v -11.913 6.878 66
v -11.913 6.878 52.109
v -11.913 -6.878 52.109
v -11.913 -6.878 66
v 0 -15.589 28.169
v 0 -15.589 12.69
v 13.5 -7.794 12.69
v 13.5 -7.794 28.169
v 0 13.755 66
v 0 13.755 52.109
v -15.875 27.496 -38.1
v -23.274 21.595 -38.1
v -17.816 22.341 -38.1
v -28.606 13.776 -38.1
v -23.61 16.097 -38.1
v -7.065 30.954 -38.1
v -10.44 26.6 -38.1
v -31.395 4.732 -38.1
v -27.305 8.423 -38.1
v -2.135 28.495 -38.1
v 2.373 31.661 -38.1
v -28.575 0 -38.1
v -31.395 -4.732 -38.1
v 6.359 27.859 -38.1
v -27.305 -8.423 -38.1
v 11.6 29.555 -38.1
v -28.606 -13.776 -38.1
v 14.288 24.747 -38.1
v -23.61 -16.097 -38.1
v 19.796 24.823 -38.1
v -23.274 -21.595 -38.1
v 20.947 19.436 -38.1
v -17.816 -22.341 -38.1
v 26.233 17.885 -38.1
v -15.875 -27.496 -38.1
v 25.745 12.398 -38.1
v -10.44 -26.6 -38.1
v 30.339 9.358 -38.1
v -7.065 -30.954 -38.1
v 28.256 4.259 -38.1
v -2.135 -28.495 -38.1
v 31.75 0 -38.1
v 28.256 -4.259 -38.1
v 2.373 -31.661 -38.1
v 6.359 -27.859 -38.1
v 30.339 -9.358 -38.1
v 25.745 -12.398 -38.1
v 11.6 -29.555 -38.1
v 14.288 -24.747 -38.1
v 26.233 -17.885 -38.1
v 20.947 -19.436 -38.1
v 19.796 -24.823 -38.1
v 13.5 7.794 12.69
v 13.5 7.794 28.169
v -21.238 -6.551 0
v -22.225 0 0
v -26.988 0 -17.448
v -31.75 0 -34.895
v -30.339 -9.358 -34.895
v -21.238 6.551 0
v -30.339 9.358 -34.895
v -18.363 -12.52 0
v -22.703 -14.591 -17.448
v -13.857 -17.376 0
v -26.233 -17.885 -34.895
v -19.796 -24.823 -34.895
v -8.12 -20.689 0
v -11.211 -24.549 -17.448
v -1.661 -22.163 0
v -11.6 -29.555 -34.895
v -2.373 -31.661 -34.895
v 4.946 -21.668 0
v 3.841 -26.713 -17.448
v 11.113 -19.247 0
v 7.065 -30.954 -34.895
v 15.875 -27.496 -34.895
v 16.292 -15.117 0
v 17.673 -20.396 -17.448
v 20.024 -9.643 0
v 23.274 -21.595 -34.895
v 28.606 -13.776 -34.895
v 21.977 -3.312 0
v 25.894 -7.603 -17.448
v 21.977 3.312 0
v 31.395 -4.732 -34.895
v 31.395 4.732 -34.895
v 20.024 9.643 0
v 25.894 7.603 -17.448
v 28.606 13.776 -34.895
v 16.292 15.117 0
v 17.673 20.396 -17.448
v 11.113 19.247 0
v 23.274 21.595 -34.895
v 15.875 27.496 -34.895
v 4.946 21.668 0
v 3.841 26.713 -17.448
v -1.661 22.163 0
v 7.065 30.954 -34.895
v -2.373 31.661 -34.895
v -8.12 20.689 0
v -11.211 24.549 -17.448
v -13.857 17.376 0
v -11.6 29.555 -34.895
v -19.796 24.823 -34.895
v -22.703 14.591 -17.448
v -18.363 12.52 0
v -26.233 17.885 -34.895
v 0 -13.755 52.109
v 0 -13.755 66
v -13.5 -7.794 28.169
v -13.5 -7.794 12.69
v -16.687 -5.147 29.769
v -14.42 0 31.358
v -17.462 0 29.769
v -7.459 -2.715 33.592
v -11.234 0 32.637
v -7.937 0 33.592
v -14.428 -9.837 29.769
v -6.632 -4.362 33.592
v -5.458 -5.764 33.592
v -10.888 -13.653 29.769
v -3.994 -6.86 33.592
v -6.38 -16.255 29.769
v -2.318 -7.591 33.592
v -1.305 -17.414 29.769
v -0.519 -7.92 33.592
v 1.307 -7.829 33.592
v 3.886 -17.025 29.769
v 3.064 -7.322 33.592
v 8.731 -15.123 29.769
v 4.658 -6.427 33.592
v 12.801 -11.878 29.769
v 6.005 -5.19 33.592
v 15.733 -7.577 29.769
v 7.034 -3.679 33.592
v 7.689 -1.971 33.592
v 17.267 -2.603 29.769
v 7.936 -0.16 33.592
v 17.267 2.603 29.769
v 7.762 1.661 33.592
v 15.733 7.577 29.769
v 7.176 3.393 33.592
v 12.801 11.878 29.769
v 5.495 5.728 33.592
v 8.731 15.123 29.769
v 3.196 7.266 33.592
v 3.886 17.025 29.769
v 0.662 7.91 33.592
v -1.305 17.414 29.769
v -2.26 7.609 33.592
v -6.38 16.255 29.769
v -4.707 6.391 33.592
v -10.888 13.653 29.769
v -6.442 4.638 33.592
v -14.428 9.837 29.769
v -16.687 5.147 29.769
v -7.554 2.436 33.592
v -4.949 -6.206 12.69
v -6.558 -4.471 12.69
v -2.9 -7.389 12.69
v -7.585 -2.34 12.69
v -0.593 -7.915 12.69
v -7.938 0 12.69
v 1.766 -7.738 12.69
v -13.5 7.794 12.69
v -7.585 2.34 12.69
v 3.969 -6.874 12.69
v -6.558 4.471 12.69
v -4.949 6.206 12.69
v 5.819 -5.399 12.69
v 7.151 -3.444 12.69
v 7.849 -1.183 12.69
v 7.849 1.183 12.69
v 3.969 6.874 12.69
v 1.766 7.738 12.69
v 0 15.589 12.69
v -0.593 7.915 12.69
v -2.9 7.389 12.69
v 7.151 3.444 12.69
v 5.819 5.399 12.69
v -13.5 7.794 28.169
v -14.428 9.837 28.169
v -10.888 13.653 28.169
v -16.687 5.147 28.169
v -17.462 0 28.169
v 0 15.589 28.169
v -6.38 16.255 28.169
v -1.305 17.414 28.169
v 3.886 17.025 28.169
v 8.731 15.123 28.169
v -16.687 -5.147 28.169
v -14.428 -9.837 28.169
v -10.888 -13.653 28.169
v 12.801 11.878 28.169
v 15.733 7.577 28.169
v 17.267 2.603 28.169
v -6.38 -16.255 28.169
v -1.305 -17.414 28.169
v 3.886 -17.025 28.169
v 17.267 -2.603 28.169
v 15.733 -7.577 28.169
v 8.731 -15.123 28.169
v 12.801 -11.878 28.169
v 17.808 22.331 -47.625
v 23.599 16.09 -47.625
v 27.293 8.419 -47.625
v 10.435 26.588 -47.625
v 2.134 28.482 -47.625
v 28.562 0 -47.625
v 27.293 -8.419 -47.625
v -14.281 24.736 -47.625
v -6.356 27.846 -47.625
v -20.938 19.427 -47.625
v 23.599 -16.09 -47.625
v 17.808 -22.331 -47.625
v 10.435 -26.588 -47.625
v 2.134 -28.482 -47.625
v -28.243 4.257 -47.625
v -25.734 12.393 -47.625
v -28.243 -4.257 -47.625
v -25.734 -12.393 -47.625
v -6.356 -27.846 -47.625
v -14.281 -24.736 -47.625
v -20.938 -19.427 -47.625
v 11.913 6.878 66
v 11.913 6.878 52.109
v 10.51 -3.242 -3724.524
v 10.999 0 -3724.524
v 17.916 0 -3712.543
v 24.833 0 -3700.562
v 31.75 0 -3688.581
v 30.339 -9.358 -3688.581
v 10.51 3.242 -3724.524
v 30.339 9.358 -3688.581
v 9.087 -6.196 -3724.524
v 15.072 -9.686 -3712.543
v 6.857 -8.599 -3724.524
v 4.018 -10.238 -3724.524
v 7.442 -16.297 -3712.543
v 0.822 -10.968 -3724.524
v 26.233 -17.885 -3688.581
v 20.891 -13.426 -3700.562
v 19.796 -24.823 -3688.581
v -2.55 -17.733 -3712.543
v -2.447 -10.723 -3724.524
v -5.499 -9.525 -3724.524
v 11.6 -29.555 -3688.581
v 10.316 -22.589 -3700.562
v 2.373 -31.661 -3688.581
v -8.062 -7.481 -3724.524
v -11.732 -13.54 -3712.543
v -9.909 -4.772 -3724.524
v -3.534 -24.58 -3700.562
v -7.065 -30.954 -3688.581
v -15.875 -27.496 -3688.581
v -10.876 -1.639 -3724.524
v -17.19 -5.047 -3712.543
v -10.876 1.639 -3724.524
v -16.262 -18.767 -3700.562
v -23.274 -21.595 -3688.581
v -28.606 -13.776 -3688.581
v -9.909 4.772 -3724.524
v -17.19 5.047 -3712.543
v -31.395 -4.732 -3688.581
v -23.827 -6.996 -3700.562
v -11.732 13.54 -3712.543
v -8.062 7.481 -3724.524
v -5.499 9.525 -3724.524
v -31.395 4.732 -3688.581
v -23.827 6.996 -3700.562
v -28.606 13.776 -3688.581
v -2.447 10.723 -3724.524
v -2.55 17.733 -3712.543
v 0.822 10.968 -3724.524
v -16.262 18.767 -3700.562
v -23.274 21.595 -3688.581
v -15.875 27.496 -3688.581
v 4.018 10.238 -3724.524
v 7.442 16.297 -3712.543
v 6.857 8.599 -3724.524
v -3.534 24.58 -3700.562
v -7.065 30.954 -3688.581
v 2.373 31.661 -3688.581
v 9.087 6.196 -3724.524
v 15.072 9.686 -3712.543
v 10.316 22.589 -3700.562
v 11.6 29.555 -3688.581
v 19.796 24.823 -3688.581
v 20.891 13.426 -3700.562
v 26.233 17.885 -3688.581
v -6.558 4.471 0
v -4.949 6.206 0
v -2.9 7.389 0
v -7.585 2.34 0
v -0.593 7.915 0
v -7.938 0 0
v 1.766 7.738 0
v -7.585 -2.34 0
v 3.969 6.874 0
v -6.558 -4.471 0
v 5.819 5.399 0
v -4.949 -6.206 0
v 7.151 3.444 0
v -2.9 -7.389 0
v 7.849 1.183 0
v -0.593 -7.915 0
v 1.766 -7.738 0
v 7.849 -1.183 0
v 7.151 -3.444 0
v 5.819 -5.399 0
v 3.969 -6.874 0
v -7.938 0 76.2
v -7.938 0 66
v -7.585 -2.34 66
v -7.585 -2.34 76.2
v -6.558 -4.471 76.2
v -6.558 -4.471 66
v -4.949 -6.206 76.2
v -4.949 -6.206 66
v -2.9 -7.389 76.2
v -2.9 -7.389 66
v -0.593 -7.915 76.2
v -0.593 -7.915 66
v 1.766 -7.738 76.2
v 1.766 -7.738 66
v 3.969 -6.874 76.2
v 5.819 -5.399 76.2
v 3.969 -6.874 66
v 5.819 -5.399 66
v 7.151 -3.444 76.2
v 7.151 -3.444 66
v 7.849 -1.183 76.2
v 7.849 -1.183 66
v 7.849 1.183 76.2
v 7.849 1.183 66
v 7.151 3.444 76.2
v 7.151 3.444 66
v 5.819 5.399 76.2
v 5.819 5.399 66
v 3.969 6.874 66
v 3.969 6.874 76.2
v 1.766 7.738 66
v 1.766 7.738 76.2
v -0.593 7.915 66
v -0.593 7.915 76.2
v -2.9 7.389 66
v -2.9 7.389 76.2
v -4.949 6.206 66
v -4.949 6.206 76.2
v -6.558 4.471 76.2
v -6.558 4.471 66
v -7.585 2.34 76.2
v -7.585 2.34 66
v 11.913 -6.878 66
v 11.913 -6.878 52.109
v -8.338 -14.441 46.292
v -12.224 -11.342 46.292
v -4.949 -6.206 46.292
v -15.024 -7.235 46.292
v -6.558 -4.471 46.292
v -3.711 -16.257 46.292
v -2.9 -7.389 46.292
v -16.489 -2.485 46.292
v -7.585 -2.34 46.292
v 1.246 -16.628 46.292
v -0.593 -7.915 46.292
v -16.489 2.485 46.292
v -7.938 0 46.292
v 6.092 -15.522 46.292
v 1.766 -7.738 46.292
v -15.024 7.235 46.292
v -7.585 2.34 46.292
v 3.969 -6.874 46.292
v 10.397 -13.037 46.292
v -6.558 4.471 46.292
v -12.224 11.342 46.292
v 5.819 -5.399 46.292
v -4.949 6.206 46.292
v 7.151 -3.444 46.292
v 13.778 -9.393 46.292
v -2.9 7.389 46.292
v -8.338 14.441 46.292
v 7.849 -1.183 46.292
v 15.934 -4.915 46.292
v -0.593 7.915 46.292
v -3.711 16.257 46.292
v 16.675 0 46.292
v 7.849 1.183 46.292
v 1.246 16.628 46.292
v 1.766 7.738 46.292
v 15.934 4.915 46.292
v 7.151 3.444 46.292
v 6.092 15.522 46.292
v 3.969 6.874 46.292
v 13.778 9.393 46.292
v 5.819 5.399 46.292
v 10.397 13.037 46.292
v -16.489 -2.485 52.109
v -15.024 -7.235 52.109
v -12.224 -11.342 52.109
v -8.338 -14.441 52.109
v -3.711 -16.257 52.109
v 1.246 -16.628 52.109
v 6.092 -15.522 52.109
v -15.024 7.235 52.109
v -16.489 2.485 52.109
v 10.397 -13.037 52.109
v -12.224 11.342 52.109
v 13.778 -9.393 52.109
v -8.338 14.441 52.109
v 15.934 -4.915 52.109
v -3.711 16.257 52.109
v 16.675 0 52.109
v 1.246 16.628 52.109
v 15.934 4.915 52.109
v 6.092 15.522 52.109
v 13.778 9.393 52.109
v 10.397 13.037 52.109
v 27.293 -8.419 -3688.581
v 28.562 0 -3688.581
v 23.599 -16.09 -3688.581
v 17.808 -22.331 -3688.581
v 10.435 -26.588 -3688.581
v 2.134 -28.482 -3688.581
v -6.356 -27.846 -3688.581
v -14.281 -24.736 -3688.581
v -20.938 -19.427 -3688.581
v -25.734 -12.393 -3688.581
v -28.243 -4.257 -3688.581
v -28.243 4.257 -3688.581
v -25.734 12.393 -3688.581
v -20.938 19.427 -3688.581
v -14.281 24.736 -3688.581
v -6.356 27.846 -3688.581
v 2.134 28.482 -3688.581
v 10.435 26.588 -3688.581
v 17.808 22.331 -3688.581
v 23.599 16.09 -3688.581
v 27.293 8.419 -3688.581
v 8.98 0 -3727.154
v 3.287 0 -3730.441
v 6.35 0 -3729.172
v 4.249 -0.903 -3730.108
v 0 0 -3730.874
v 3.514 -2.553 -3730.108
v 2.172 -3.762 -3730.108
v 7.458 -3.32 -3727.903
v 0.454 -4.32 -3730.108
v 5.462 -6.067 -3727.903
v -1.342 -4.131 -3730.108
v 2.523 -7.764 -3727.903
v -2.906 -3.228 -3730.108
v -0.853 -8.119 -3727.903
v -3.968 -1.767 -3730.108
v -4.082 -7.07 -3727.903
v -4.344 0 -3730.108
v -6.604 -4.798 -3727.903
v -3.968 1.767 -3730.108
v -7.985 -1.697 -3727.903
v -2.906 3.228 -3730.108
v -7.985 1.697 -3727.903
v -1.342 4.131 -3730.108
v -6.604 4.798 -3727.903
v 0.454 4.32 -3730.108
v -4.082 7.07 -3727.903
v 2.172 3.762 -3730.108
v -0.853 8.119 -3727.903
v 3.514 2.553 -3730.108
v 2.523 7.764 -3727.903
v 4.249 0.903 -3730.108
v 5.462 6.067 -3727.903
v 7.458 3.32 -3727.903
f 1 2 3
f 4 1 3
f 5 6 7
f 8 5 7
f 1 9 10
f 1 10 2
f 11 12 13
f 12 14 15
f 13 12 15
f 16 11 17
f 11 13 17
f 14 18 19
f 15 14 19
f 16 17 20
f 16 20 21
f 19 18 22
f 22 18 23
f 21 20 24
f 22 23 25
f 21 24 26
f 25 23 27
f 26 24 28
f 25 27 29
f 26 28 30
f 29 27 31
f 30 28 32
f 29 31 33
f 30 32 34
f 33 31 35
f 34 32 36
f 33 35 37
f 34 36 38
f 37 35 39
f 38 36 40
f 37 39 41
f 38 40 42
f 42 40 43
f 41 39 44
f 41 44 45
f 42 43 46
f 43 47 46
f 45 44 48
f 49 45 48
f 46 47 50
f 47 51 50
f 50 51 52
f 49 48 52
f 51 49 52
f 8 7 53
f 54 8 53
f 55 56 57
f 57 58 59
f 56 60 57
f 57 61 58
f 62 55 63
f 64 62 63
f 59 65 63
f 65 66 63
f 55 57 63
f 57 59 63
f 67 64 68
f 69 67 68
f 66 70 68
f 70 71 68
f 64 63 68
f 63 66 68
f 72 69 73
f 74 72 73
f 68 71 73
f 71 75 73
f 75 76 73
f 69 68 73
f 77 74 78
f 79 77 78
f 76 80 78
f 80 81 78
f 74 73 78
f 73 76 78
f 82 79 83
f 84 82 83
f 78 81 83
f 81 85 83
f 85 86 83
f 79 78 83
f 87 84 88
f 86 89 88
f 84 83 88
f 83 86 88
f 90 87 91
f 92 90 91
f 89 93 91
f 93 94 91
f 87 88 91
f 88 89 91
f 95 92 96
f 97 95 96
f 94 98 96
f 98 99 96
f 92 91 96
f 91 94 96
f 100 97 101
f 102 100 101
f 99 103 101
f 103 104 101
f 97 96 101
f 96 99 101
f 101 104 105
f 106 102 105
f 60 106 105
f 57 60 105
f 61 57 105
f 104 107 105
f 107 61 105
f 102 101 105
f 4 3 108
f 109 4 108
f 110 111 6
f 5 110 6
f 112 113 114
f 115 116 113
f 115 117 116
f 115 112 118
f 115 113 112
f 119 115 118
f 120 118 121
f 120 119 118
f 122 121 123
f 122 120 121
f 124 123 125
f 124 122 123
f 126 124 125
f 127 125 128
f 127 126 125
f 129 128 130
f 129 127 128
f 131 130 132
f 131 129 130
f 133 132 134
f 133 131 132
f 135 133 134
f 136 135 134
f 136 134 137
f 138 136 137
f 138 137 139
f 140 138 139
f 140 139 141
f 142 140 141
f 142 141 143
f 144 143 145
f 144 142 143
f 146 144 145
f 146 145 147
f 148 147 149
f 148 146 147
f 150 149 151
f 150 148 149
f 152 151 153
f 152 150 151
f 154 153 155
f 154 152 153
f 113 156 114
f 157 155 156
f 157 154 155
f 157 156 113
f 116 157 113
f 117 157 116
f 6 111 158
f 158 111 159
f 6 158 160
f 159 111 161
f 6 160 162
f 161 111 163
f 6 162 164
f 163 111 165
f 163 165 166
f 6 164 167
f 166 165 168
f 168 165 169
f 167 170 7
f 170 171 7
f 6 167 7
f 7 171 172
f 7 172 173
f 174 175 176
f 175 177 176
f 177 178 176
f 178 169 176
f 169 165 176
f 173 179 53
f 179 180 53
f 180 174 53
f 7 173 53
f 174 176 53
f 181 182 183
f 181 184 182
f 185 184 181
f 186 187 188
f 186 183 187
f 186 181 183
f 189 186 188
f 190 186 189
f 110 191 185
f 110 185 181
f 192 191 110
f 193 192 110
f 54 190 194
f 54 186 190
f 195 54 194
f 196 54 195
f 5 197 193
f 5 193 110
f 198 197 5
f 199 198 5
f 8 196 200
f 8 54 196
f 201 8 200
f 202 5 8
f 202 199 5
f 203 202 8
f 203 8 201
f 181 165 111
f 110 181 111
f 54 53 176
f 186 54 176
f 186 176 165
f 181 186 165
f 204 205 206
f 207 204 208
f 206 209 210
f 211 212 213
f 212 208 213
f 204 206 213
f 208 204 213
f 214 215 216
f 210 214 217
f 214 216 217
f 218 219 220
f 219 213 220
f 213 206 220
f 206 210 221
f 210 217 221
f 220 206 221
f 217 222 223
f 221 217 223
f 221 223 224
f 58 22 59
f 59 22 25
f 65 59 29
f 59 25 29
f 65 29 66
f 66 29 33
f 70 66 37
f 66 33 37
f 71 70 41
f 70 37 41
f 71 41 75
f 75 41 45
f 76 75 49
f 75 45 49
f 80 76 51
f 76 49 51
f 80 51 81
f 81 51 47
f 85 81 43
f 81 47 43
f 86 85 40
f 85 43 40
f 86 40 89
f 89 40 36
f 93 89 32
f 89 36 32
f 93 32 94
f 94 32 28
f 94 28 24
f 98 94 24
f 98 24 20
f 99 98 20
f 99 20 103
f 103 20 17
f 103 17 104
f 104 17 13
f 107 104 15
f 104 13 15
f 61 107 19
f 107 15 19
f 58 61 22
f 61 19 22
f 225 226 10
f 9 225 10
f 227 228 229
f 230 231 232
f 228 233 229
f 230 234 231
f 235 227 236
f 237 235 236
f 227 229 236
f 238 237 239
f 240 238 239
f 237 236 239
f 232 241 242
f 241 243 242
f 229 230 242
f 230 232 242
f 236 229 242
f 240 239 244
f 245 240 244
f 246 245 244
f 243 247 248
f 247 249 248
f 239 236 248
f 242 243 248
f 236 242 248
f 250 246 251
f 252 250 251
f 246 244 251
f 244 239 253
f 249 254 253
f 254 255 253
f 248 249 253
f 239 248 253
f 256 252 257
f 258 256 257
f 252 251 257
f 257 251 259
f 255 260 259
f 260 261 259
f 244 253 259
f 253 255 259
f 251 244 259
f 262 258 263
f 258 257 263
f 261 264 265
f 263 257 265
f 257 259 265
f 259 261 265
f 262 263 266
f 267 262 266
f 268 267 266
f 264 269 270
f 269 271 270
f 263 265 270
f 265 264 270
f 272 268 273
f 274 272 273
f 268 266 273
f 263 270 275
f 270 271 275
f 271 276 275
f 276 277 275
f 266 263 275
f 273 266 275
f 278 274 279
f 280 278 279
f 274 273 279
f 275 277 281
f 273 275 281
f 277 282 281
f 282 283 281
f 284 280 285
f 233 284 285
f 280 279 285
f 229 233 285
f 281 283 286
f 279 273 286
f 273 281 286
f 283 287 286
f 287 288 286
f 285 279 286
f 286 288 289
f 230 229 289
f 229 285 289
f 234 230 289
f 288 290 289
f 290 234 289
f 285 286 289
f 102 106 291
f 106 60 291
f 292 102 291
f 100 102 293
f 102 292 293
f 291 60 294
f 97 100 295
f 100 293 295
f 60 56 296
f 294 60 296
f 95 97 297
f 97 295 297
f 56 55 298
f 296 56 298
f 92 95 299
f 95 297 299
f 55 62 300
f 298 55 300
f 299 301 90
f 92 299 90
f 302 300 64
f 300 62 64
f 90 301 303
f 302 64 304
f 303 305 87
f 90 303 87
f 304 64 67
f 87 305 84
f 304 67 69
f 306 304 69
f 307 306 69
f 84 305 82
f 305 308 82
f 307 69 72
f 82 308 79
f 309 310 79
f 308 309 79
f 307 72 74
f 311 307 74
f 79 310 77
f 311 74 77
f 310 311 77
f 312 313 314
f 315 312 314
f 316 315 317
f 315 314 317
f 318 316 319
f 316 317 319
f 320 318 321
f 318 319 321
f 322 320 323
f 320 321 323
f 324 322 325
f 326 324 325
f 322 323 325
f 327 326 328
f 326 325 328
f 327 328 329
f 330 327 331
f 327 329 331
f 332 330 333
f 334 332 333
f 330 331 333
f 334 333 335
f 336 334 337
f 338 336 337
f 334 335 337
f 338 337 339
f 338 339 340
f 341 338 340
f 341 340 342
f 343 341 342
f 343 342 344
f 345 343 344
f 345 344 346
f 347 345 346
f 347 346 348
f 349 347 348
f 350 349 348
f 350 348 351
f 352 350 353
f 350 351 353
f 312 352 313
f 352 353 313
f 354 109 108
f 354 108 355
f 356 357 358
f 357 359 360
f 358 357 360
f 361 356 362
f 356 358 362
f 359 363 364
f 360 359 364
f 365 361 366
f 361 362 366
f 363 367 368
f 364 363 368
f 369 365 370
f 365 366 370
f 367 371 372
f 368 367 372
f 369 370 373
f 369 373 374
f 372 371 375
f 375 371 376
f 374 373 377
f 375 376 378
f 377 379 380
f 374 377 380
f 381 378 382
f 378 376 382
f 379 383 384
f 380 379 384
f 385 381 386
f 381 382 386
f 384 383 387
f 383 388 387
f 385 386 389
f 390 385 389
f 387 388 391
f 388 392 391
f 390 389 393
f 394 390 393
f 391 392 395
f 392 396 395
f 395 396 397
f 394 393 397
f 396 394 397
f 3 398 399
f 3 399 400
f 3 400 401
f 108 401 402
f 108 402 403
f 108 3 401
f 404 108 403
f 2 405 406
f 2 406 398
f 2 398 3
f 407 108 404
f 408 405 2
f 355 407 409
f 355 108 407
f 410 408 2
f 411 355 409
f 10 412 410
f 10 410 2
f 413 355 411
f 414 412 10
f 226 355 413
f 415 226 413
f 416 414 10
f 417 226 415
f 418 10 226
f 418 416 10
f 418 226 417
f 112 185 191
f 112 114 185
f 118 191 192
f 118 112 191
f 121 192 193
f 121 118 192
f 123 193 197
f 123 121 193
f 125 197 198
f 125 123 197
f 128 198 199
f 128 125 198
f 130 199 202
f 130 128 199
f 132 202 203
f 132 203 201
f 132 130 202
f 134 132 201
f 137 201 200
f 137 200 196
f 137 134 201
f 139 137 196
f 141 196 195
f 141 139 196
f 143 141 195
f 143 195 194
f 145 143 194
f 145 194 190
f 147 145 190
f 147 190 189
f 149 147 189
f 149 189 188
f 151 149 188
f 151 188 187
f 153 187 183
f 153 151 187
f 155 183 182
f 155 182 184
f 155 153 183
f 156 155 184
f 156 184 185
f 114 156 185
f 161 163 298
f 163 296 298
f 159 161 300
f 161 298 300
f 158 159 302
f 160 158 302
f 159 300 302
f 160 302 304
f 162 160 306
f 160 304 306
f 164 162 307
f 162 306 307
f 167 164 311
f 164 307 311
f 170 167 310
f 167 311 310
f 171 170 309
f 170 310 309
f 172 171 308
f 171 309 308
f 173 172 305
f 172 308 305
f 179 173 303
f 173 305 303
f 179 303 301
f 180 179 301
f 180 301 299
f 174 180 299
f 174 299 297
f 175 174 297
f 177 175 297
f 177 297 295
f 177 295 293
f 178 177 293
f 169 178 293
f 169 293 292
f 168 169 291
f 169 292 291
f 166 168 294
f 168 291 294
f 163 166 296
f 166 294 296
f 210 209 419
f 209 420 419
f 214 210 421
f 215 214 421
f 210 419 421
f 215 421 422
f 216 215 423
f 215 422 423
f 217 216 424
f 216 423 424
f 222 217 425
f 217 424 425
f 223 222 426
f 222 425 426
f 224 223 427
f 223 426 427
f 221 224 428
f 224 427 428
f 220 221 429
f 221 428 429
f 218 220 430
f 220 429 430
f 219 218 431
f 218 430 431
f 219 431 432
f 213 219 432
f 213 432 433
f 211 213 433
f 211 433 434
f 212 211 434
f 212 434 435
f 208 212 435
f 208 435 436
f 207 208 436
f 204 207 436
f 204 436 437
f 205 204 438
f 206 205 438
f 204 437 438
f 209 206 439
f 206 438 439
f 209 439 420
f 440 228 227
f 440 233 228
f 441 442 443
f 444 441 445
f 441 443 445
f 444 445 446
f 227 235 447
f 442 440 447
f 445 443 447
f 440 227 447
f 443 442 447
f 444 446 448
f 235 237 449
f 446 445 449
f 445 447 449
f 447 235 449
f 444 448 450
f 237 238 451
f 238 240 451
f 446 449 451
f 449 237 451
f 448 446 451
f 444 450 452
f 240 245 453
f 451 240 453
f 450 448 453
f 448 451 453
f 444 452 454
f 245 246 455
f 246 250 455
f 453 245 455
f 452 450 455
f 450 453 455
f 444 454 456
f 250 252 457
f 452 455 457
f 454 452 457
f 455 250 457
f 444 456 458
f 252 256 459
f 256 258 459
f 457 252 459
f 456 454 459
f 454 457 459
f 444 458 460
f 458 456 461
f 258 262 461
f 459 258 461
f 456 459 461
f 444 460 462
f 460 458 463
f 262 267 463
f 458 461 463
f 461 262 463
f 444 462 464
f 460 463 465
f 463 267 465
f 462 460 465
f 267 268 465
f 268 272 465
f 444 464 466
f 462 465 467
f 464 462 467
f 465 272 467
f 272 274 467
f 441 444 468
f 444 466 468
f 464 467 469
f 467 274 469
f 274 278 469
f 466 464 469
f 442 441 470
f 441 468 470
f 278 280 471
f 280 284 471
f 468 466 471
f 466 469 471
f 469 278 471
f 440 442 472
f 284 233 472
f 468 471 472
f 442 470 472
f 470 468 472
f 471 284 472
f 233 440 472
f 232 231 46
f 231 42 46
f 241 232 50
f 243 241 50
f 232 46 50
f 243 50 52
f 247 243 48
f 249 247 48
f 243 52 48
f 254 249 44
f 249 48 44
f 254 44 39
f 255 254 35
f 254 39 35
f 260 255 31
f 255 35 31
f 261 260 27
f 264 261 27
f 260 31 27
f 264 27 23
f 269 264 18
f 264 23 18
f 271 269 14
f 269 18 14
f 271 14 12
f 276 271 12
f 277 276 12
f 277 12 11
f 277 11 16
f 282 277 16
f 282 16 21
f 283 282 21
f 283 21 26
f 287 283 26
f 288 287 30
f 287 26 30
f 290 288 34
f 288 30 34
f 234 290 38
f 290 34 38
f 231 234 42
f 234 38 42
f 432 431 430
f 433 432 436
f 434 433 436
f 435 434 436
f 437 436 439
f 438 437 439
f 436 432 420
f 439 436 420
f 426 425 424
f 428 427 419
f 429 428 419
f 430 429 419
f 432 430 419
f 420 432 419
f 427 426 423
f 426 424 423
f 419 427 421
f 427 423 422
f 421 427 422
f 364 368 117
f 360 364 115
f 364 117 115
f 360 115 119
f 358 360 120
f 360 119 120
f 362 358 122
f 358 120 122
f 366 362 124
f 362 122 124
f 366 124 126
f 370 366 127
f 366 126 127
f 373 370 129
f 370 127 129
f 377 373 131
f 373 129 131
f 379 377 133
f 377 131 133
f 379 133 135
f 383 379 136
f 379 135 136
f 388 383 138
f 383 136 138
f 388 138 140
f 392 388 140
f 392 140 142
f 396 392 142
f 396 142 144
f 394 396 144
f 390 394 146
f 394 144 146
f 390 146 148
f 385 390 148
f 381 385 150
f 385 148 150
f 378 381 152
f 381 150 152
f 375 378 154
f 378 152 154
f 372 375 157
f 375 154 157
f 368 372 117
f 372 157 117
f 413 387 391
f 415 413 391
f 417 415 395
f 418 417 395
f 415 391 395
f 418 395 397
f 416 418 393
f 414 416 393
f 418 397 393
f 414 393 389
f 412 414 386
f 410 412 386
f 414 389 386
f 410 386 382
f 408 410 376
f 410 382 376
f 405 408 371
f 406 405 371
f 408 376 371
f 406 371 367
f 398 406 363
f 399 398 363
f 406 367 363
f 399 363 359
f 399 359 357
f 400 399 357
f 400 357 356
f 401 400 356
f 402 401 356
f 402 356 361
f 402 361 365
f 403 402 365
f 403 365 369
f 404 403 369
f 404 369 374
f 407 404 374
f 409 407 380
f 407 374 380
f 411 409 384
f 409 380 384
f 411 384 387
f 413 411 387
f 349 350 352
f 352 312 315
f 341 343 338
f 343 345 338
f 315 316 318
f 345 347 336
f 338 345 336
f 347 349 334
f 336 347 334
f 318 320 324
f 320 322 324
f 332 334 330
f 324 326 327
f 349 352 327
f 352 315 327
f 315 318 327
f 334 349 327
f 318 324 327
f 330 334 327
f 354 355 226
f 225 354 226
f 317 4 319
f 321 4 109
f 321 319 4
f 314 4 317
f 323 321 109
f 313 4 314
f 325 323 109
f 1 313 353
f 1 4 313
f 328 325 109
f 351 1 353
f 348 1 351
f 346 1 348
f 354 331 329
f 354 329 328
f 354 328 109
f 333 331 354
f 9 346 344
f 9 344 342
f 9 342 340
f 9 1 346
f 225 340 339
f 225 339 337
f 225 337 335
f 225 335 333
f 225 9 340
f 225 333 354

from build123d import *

# Parameters (mm, degrees)
BOSS_REVOLVE3_START         = 12.690475
BOSS_REVOLVE3_OUTLINE_R     = 7.9375
BOSS_REVOLVE3_DEPTH         = 15.478125
BOSS_REVOLVE3_START_2       = 46.292398399
BOSS_REVOLVE3_2_OUTLINE_R   = 16.6751
BOSS_REVOLVE3_2_OUTLINE_R_2 = 7.9375
BOSS_REVOLVE3_2_DEPTH       = 5.8166
BOSS_EXTRUDE2_DEPTH         = 13.890625


# Read off the part's stored shape, not the designer's step: Boss-Revolve3
with BuildPart() as part:
    # Sketch1 → Base-Revolve (revolve)
    with BuildSketch(Plane(origin=(0, 0, 0), x_dir=(0, 0, -1), z_dir=(1, 0, 0)), mode=Mode.PRIVATE) as base_revolve_sk:
        Polygon((-76.2, 0), (-76.2, 7.9375), (0, 7.9375), (0, 22.225), (34.895210283, 31.75), (38.1, 28.575), (47.625, 28.575), (47.625, 0), align=None)
    revolve(base_revolve_sk.sketch.rotate(Axis((0, 0, 0), (0, 0, 1)), 90), axis=Axis((0, 0, 0), (0, 0, 1)))

    # Sketch3 → Boss-Revolve2 (revolve)
    with BuildSketch(Plane(origin=(0, 0, 0), x_dir=(0, 0, -1), z_dir=(1, 0, 0)), mode=Mode.PRIVATE) as boss_revolve2_sk:
        with BuildLine():
            Line((-28.1686, 0), (-28.1686, 17.4625))
            Line((-28.1686, 17.4625), (-29.7688, 17.4625))
            ThreePointArc((-29.7688, 17.4625), (-33.309963658, 9.048473715), (-34.5186, 0))
            Line((-34.5186, 0), (-28.1686, 0))
        make_face()
    revolve(boss_revolve2_sk.sketch.rotate(Axis((0, 0, 0), (0, 0, 1)), 90), axis=Axis((0, 0, 0), (0, 0, 1)))

    # Sketch2 → Boss-Revolve1 (revolve)
    with BuildSketch(Plane(origin=(0, 0, 0), x_dir=(0, 0, -1), z_dir=(1, 0, 0)), mode=Mode.PRIVATE) as boss_revolve1_sk:
        with BuildLine():
            Line((38.1, 31.75), (38.1, 28.5623))
            Line((38.1, 28.5623), (3688.581247583, 28.5623))
            Line((3688.581247583, 28.5623), (3688.581247583, 0))
            Line((3688.581247583, 0), (3730.873860723, 0))
            ThreePointArc((3730.873860723, 0), (3729.172383351, 6.35), (3724.523860723, 10.998522628))
            Line((3724.523860723, 10.998522628), (3688.581247583, 31.75))
            Line((3688.581247583, 31.75), (38.1, 31.75))
        make_face()
    revolve(boss_revolve1_sk.sketch.rotate(Axis((0, 0, 29.7434), (0, 0, -1)), 90), axis=Axis((0, 0, 29.7434), (0, 0, -1)))

    # Boss-Revolve3 outline → Boss-Revolve3 (add)
    with BuildSketch(Plane.XY.offset(BOSS_REVOLVE3_START)):
        Polygon((0, -15.588572738), (13.5001, -7.794286369), (13.5001, 7.794286369), (0, 15.588572738), (-13.5001, 7.794286369), (-13.5001, -7.794286369), align=None)
        Circle(BOSS_REVOLVE3_OUTLINE_R, mode=Mode.SUBTRACT)
    extrude(amount=BOSS_REVOLVE3_DEPTH)

    # Boss-Revolve3 2 outline → Boss-Revolve3 2 (add)
    with BuildSketch(Plane.XY.offset(BOSS_REVOLVE3_START_2)):
        Circle(BOSS_REVOLVE3_2_OUTLINE_R)
        Circle(BOSS_REVOLVE3_2_OUTLINE_R_2, mode=Mode.SUBTRACT)
    extrude(amount=BOSS_REVOLVE3_2_DEPTH)

    # Sketch6 → Boss-Extrude2 (add)
    with BuildSketch(Plane.XY.offset(52.108998399)):
        Polygon((0, -13.755485633), (11.9126, -6.877742817), (11.9126, 6.877742817), (0, 13.755485633), (-11.9126, 6.877742817), (-11.9126, -6.877742817), align=None)
    extrude(amount=BOSS_EXTRUDE2_DEPTH)


solid = part.part
